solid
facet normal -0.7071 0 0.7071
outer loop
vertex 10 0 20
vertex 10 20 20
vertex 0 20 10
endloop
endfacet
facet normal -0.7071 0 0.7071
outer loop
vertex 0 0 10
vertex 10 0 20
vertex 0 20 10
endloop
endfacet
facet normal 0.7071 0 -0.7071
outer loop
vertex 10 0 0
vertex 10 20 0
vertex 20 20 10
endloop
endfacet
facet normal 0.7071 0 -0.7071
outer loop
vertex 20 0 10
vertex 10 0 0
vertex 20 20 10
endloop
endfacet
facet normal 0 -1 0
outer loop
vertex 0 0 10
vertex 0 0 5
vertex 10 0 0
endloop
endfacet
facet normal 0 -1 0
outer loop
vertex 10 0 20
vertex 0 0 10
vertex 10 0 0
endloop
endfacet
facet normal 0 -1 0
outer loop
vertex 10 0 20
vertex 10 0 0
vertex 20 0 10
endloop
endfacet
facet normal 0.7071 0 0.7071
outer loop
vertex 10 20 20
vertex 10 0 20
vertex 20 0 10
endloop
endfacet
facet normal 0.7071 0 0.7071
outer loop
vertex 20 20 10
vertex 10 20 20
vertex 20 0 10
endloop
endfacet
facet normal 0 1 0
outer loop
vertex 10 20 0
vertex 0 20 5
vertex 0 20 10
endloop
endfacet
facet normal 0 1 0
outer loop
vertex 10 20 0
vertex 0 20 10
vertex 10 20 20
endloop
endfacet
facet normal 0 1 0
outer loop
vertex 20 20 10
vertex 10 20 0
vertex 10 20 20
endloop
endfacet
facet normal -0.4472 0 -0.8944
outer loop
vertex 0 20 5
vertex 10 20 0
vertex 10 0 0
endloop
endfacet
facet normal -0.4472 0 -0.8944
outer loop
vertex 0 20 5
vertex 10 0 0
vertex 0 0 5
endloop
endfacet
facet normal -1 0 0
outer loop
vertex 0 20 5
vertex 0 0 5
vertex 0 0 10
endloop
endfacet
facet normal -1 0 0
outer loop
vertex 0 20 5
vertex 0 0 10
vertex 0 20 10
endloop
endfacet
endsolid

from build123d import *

# Parameters (mm, degrees)
SKETCH1_W           = 20
SKETCH1_H           = 20
BOSS_EXTRUDE1_DEPTH = 20
CUT_EXTRUDE1_DEPTH  = 20
CUT_EXTRUDE2_DEPTH  = 20
CUT_EXTRUDE3_DEPTH  = 20
CUT_EXTRUDE4_DEPTH  = 20


with BuildPart() as part:
    # Sketch1 → Boss-Extrude1 (new body)
    with BuildSketch(Plane.XY):
        with Locations((10, 10)):
            Rectangle(SKETCH1_W, SKETCH1_H)
    extrude(amount=BOSS_EXTRUDE1_DEPTH)

    # Sketch2 → Cut-Extrude1 (cut)
    with BuildSketch(Plane(origin=(0, 20, 0), x_dir=(1, 0, 0), z_dir=(0, 1, 0))):
        Polygon((20, 0), (10, 0), (20, -10), align=None)
    extrude(amount=-CUT_EXTRUDE1_DEPTH, mode=Mode.SUBTRACT)

    # Sketch3 → Cut-Extrude2 (cut)
    with BuildSketch(Plane(origin=(0, 20, 0), x_dir=(1, 0, 0), z_dir=(0, 1, 0))):
        Polygon((20, -20), (10, -20), (20, -10), align=None)
    extrude(amount=-CUT_EXTRUDE2_DEPTH, mode=Mode.SUBTRACT)

    # Sketch4 → Cut-Extrude3 (cut)
    with BuildSketch(Plane(origin=(0, 20, 0), x_dir=(1, 0, 0), z_dir=(0, 1, 0))):
        Polygon((10, -20), (0, -10), (0, -20), align=None)
    extrude(amount=-CUT_EXTRUDE3_DEPTH, mode=Mode.SUBTRACT)

    # Sketch5 → Cut-Extrude4 (cut)
    with BuildSketch(Plane(origin=(0, 20, 0), x_dir=(1, 0, 0), z_dir=(0, 1, 0))):
        Polygon((10, 0), (0, -5), (0, 0), align=None)
    extrude(amount=-CUT_EXTRUDE4_DEPTH, mode=Mode.SUBTRACT)


solid = part.part
